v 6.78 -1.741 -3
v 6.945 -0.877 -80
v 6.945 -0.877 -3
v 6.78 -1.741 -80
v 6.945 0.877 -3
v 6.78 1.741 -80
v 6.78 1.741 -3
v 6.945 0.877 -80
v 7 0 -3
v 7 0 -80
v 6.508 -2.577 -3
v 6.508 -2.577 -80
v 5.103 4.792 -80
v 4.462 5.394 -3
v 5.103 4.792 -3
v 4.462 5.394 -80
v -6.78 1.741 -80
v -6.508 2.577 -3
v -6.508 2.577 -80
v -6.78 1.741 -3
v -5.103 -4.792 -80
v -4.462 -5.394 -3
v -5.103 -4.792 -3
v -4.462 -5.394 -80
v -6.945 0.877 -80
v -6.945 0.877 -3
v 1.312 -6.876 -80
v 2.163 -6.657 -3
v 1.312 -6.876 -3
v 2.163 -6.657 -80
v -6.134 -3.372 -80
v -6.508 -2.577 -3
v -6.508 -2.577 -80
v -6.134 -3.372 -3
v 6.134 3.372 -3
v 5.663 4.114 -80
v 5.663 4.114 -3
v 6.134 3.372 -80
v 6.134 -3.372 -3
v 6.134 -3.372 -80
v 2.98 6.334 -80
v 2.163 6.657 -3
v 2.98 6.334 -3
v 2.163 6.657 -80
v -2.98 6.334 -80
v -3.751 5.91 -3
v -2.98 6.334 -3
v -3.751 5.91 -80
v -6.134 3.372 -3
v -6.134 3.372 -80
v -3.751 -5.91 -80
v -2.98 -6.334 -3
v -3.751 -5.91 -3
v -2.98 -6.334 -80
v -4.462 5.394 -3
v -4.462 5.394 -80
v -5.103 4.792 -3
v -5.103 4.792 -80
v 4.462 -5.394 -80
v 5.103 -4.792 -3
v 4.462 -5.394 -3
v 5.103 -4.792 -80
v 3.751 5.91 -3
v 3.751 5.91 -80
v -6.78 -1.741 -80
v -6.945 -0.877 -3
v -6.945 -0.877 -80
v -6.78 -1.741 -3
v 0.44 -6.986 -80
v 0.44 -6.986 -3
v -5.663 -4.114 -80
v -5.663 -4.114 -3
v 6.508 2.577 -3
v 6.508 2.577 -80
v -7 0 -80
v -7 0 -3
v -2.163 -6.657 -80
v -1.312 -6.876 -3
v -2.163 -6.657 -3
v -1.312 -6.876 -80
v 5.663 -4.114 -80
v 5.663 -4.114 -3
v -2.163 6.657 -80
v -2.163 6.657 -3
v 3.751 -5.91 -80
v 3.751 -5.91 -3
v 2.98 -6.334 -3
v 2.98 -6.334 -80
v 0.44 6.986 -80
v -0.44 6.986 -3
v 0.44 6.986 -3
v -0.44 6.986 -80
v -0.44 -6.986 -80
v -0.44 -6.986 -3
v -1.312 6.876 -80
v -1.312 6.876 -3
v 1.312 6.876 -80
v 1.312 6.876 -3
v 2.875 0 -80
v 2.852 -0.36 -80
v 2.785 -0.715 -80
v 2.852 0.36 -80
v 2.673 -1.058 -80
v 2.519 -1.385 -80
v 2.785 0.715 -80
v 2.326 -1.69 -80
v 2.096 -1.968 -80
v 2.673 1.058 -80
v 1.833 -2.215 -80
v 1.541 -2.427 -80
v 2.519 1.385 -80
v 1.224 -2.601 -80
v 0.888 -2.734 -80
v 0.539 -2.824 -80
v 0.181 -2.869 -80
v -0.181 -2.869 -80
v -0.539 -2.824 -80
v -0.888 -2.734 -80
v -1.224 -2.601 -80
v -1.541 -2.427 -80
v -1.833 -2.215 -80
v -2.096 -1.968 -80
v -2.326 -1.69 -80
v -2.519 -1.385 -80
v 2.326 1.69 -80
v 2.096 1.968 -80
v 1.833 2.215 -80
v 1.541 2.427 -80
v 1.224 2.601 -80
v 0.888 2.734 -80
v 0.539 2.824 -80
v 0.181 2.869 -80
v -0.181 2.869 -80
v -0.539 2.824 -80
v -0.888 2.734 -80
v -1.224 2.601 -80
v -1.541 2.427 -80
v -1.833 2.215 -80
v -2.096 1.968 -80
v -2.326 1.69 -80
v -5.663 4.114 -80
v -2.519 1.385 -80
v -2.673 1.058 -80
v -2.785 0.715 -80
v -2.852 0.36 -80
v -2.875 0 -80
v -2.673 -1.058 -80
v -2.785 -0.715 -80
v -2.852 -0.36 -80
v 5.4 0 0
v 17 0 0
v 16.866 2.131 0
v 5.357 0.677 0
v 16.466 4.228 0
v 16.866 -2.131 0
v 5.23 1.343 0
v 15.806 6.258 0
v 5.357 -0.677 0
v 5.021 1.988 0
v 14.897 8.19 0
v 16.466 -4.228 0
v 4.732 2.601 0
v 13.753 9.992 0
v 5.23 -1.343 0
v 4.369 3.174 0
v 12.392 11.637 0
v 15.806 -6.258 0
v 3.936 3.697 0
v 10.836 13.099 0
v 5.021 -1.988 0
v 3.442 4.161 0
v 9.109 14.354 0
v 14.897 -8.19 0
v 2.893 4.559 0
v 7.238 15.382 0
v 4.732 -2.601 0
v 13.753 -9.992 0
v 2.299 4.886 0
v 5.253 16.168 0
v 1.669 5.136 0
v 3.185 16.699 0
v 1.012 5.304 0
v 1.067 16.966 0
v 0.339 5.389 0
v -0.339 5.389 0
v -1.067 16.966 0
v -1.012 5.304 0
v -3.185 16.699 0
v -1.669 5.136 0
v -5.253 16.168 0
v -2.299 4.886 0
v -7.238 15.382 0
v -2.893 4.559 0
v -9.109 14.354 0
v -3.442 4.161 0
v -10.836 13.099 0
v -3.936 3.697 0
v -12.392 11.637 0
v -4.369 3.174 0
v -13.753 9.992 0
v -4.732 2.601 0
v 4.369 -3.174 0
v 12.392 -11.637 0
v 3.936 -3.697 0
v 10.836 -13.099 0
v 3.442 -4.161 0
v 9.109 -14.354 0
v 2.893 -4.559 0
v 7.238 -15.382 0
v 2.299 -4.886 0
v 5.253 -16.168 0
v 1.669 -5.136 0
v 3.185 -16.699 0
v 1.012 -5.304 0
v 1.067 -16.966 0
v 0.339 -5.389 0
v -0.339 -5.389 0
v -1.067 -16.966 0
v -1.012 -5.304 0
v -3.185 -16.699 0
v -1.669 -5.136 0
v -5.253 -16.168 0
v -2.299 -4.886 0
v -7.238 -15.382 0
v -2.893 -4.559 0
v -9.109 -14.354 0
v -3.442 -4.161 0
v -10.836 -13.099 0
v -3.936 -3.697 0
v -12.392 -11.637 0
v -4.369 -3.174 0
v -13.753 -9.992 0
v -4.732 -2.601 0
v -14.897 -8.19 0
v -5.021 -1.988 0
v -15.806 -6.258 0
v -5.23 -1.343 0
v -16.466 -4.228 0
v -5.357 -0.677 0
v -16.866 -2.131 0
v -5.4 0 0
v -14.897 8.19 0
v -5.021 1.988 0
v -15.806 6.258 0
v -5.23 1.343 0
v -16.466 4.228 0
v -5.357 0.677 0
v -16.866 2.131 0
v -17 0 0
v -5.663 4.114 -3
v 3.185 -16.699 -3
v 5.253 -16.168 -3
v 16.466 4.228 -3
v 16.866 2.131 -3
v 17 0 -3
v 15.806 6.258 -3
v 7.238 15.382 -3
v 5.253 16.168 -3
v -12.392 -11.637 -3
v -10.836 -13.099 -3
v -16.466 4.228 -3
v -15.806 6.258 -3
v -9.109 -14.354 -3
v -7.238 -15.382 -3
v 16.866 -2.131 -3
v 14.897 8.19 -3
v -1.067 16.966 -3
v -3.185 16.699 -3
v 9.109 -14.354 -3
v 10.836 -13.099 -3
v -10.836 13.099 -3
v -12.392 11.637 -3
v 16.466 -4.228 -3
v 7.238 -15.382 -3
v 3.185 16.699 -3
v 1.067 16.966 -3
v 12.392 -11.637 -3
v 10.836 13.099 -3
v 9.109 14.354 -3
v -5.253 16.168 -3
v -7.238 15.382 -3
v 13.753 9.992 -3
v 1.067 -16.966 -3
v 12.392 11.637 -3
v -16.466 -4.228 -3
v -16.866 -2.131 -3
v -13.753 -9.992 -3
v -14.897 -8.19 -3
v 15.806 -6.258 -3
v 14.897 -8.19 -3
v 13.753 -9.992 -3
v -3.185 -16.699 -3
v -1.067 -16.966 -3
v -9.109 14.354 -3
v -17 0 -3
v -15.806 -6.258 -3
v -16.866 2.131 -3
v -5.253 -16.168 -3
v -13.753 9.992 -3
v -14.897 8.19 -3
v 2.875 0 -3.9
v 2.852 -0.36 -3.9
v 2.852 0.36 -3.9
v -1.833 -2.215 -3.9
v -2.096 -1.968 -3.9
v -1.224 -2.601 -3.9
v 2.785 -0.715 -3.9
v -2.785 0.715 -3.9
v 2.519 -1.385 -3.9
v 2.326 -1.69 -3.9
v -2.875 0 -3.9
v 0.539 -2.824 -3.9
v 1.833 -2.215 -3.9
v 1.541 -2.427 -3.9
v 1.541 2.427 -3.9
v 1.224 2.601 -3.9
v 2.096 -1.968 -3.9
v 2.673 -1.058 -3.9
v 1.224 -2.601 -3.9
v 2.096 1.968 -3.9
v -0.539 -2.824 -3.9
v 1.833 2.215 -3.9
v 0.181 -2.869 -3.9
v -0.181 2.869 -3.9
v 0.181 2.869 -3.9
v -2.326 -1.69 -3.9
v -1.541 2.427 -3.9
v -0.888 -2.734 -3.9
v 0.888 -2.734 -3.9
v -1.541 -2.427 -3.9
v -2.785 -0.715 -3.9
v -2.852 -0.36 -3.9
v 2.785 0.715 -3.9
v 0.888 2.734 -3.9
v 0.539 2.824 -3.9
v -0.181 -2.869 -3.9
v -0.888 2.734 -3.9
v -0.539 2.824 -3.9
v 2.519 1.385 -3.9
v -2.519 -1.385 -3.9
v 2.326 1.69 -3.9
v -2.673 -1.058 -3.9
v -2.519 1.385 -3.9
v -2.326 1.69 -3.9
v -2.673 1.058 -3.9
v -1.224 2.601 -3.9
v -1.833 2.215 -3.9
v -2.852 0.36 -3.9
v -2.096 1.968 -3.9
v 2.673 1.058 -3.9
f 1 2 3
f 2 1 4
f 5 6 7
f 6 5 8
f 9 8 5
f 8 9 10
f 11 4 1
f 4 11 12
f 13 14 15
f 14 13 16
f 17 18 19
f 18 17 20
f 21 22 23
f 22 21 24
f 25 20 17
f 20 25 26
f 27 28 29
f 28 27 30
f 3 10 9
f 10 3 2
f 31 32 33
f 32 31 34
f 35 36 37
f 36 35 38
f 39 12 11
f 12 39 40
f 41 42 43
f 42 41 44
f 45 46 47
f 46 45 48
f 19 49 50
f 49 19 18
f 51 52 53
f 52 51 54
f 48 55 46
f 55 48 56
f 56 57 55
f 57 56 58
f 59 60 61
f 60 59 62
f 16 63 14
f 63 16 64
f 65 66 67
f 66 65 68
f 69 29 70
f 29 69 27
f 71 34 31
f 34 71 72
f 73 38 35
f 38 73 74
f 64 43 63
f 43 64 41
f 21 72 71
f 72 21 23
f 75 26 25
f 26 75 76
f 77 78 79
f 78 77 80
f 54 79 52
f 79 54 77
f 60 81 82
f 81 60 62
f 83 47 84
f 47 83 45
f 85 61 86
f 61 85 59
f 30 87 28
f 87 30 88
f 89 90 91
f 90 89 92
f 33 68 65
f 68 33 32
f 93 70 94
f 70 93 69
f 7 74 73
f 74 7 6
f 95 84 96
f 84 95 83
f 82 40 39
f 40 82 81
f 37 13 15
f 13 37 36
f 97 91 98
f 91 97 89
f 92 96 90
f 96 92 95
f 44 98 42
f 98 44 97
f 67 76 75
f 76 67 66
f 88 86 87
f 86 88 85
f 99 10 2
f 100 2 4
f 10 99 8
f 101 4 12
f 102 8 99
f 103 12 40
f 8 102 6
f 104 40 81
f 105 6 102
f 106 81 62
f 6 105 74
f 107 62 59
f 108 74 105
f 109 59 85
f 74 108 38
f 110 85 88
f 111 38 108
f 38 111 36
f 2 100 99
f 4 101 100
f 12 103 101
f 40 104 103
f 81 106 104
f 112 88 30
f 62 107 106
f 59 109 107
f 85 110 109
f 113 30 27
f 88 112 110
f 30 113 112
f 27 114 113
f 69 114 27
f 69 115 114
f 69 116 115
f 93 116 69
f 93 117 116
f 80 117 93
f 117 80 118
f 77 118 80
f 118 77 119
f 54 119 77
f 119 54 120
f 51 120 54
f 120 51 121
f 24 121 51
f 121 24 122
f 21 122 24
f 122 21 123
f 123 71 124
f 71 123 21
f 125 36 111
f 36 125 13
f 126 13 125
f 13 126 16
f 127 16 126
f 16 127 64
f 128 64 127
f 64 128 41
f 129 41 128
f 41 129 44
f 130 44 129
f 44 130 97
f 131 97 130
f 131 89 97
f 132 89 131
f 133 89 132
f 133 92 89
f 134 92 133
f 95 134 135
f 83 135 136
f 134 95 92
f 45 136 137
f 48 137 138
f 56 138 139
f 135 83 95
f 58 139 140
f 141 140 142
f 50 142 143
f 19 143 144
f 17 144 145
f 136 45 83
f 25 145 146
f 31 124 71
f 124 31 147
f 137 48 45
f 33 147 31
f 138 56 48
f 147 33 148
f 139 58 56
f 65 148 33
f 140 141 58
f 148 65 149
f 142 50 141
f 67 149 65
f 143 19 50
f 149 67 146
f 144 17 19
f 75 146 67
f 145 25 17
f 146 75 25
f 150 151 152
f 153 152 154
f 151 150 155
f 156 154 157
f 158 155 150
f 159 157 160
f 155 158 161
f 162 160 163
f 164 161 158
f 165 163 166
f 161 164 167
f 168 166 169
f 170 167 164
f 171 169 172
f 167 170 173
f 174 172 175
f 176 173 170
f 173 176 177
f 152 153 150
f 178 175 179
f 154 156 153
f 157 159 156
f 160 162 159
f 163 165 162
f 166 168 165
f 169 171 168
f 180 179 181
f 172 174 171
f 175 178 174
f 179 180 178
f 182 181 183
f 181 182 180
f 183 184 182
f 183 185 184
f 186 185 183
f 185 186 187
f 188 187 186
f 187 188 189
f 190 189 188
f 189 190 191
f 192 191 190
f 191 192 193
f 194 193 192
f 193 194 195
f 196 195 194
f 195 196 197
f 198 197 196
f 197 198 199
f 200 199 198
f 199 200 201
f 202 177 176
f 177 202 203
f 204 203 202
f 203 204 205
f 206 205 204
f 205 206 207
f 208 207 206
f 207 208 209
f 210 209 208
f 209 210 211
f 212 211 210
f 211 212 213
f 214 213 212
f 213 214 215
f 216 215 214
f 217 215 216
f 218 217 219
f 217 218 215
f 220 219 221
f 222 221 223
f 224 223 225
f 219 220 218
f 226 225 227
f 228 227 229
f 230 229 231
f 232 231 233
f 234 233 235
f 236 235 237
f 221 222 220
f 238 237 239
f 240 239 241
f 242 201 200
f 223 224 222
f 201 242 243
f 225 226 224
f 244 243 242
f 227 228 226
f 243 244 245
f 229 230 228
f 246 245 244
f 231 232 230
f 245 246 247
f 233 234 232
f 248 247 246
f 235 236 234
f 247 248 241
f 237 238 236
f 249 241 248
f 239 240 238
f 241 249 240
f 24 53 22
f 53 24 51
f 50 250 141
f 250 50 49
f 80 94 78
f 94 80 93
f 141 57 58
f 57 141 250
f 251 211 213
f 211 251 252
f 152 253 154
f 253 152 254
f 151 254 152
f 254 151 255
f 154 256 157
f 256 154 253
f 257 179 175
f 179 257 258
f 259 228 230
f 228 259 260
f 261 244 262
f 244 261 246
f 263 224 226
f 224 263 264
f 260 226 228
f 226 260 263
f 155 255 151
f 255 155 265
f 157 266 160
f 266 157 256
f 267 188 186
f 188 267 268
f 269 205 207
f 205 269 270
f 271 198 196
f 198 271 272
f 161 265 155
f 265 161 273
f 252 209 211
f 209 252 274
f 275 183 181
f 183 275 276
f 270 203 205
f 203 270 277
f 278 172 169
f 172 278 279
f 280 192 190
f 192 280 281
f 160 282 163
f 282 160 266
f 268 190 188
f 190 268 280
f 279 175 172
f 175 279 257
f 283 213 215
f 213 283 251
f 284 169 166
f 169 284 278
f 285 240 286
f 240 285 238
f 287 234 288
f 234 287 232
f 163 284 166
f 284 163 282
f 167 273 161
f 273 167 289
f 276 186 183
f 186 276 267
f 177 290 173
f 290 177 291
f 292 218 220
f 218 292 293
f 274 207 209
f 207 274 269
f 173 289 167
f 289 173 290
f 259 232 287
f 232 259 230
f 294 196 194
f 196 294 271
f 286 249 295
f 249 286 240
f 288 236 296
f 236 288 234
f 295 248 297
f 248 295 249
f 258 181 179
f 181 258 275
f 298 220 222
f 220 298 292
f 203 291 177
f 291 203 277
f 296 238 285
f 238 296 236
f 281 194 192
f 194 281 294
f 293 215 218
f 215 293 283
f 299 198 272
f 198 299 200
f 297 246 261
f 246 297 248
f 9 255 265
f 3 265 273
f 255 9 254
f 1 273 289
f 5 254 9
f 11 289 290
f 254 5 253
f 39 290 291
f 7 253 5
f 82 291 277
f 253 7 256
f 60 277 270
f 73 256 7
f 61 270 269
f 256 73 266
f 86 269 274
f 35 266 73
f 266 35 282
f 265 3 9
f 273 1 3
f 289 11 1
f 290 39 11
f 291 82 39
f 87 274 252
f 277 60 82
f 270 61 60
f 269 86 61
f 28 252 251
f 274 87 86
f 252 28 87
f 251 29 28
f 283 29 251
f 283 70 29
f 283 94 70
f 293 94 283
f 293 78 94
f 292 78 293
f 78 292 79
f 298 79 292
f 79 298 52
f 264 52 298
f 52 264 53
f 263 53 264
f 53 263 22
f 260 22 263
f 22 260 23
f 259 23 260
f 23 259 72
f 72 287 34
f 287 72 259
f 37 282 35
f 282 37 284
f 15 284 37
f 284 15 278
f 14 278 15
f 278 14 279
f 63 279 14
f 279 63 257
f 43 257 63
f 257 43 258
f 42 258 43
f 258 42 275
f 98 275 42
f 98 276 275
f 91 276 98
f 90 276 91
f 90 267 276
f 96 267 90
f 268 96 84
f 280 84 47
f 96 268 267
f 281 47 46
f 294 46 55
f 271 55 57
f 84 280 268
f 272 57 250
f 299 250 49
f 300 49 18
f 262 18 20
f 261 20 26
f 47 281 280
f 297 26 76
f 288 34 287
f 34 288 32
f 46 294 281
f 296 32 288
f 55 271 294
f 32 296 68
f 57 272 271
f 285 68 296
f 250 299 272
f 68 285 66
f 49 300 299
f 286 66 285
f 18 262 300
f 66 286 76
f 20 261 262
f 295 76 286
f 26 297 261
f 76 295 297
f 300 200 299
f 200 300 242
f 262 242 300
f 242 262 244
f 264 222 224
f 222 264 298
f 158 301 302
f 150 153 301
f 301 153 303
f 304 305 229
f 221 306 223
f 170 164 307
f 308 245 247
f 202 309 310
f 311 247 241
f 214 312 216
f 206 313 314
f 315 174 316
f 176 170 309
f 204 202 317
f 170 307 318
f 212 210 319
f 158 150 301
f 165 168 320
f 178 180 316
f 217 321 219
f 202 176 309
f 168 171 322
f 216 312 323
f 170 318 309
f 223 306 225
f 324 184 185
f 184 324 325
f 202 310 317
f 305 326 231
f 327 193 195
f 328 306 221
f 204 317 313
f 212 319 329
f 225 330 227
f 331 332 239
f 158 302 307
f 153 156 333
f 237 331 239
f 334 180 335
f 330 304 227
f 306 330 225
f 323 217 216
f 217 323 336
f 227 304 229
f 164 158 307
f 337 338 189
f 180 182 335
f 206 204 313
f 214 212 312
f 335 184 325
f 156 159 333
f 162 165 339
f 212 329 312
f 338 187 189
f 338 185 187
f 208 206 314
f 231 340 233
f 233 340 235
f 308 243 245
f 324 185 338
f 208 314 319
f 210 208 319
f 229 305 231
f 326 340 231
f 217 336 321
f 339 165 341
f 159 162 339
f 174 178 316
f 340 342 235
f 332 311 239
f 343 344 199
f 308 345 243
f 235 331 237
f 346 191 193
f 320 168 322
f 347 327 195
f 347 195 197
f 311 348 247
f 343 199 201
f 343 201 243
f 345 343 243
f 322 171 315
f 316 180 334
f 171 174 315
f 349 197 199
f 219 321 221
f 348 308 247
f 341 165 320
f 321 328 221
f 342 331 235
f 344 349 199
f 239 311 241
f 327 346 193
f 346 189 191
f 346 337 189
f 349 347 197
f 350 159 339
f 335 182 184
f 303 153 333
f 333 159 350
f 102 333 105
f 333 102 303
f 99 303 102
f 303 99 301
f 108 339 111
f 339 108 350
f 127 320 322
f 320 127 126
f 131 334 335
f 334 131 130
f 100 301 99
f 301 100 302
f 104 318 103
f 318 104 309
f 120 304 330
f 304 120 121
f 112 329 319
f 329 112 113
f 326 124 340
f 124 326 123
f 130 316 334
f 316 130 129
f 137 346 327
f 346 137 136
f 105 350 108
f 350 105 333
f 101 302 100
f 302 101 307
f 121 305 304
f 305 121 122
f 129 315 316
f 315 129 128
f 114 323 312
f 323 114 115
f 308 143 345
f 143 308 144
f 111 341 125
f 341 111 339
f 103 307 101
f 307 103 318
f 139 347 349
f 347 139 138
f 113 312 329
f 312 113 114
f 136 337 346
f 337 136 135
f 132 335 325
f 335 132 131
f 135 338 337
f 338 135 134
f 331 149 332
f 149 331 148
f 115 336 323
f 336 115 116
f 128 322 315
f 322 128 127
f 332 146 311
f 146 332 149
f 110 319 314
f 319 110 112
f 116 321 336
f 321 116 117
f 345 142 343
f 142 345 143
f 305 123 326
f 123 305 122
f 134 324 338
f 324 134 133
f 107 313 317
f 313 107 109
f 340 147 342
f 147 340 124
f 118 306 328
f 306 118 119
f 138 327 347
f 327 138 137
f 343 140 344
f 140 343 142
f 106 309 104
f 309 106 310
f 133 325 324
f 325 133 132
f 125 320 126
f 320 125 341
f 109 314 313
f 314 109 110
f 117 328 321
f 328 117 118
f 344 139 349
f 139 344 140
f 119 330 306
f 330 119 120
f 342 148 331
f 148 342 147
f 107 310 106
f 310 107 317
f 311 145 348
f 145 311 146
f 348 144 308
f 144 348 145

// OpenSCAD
$fn = 50;


difference() {
	union() {
		translate(v = [0, 0, -80.0000000000]) {
			cylinder(h = 80, r = 7.0000000000);
		}
		translate(v = [0, 0, -3.0000000000]) {
			cylinder(h = 3, r = 17.0000000000);
		}
	}
	union() {
		translate(v = [0, 0, 0]) {
			rotate(a = [0, 0, 0]) {
				difference() {
					union() {
						#translate(v = [0, 0, -80.0000000000]) {
							cylinder(h = 80, r = 2.6000000000);
						}
						#translate(v = [0, 0, -3.9000000000]) {
							cylinder(h = 3.9000000000, r1 = 2.8750000000, r2 = 5.4000000000);
						}
						#translate(v = [0, 0, -80.0000000000]) {
							cylinder(h = 80, r = 2.8750000000);
						}
						#translate(v = [0, 0, -80.0000000000]) {
							cylinder(h = 80, r = 2.6000000000);
						}
					}
					union();
				}
			}
		}
	}
}
